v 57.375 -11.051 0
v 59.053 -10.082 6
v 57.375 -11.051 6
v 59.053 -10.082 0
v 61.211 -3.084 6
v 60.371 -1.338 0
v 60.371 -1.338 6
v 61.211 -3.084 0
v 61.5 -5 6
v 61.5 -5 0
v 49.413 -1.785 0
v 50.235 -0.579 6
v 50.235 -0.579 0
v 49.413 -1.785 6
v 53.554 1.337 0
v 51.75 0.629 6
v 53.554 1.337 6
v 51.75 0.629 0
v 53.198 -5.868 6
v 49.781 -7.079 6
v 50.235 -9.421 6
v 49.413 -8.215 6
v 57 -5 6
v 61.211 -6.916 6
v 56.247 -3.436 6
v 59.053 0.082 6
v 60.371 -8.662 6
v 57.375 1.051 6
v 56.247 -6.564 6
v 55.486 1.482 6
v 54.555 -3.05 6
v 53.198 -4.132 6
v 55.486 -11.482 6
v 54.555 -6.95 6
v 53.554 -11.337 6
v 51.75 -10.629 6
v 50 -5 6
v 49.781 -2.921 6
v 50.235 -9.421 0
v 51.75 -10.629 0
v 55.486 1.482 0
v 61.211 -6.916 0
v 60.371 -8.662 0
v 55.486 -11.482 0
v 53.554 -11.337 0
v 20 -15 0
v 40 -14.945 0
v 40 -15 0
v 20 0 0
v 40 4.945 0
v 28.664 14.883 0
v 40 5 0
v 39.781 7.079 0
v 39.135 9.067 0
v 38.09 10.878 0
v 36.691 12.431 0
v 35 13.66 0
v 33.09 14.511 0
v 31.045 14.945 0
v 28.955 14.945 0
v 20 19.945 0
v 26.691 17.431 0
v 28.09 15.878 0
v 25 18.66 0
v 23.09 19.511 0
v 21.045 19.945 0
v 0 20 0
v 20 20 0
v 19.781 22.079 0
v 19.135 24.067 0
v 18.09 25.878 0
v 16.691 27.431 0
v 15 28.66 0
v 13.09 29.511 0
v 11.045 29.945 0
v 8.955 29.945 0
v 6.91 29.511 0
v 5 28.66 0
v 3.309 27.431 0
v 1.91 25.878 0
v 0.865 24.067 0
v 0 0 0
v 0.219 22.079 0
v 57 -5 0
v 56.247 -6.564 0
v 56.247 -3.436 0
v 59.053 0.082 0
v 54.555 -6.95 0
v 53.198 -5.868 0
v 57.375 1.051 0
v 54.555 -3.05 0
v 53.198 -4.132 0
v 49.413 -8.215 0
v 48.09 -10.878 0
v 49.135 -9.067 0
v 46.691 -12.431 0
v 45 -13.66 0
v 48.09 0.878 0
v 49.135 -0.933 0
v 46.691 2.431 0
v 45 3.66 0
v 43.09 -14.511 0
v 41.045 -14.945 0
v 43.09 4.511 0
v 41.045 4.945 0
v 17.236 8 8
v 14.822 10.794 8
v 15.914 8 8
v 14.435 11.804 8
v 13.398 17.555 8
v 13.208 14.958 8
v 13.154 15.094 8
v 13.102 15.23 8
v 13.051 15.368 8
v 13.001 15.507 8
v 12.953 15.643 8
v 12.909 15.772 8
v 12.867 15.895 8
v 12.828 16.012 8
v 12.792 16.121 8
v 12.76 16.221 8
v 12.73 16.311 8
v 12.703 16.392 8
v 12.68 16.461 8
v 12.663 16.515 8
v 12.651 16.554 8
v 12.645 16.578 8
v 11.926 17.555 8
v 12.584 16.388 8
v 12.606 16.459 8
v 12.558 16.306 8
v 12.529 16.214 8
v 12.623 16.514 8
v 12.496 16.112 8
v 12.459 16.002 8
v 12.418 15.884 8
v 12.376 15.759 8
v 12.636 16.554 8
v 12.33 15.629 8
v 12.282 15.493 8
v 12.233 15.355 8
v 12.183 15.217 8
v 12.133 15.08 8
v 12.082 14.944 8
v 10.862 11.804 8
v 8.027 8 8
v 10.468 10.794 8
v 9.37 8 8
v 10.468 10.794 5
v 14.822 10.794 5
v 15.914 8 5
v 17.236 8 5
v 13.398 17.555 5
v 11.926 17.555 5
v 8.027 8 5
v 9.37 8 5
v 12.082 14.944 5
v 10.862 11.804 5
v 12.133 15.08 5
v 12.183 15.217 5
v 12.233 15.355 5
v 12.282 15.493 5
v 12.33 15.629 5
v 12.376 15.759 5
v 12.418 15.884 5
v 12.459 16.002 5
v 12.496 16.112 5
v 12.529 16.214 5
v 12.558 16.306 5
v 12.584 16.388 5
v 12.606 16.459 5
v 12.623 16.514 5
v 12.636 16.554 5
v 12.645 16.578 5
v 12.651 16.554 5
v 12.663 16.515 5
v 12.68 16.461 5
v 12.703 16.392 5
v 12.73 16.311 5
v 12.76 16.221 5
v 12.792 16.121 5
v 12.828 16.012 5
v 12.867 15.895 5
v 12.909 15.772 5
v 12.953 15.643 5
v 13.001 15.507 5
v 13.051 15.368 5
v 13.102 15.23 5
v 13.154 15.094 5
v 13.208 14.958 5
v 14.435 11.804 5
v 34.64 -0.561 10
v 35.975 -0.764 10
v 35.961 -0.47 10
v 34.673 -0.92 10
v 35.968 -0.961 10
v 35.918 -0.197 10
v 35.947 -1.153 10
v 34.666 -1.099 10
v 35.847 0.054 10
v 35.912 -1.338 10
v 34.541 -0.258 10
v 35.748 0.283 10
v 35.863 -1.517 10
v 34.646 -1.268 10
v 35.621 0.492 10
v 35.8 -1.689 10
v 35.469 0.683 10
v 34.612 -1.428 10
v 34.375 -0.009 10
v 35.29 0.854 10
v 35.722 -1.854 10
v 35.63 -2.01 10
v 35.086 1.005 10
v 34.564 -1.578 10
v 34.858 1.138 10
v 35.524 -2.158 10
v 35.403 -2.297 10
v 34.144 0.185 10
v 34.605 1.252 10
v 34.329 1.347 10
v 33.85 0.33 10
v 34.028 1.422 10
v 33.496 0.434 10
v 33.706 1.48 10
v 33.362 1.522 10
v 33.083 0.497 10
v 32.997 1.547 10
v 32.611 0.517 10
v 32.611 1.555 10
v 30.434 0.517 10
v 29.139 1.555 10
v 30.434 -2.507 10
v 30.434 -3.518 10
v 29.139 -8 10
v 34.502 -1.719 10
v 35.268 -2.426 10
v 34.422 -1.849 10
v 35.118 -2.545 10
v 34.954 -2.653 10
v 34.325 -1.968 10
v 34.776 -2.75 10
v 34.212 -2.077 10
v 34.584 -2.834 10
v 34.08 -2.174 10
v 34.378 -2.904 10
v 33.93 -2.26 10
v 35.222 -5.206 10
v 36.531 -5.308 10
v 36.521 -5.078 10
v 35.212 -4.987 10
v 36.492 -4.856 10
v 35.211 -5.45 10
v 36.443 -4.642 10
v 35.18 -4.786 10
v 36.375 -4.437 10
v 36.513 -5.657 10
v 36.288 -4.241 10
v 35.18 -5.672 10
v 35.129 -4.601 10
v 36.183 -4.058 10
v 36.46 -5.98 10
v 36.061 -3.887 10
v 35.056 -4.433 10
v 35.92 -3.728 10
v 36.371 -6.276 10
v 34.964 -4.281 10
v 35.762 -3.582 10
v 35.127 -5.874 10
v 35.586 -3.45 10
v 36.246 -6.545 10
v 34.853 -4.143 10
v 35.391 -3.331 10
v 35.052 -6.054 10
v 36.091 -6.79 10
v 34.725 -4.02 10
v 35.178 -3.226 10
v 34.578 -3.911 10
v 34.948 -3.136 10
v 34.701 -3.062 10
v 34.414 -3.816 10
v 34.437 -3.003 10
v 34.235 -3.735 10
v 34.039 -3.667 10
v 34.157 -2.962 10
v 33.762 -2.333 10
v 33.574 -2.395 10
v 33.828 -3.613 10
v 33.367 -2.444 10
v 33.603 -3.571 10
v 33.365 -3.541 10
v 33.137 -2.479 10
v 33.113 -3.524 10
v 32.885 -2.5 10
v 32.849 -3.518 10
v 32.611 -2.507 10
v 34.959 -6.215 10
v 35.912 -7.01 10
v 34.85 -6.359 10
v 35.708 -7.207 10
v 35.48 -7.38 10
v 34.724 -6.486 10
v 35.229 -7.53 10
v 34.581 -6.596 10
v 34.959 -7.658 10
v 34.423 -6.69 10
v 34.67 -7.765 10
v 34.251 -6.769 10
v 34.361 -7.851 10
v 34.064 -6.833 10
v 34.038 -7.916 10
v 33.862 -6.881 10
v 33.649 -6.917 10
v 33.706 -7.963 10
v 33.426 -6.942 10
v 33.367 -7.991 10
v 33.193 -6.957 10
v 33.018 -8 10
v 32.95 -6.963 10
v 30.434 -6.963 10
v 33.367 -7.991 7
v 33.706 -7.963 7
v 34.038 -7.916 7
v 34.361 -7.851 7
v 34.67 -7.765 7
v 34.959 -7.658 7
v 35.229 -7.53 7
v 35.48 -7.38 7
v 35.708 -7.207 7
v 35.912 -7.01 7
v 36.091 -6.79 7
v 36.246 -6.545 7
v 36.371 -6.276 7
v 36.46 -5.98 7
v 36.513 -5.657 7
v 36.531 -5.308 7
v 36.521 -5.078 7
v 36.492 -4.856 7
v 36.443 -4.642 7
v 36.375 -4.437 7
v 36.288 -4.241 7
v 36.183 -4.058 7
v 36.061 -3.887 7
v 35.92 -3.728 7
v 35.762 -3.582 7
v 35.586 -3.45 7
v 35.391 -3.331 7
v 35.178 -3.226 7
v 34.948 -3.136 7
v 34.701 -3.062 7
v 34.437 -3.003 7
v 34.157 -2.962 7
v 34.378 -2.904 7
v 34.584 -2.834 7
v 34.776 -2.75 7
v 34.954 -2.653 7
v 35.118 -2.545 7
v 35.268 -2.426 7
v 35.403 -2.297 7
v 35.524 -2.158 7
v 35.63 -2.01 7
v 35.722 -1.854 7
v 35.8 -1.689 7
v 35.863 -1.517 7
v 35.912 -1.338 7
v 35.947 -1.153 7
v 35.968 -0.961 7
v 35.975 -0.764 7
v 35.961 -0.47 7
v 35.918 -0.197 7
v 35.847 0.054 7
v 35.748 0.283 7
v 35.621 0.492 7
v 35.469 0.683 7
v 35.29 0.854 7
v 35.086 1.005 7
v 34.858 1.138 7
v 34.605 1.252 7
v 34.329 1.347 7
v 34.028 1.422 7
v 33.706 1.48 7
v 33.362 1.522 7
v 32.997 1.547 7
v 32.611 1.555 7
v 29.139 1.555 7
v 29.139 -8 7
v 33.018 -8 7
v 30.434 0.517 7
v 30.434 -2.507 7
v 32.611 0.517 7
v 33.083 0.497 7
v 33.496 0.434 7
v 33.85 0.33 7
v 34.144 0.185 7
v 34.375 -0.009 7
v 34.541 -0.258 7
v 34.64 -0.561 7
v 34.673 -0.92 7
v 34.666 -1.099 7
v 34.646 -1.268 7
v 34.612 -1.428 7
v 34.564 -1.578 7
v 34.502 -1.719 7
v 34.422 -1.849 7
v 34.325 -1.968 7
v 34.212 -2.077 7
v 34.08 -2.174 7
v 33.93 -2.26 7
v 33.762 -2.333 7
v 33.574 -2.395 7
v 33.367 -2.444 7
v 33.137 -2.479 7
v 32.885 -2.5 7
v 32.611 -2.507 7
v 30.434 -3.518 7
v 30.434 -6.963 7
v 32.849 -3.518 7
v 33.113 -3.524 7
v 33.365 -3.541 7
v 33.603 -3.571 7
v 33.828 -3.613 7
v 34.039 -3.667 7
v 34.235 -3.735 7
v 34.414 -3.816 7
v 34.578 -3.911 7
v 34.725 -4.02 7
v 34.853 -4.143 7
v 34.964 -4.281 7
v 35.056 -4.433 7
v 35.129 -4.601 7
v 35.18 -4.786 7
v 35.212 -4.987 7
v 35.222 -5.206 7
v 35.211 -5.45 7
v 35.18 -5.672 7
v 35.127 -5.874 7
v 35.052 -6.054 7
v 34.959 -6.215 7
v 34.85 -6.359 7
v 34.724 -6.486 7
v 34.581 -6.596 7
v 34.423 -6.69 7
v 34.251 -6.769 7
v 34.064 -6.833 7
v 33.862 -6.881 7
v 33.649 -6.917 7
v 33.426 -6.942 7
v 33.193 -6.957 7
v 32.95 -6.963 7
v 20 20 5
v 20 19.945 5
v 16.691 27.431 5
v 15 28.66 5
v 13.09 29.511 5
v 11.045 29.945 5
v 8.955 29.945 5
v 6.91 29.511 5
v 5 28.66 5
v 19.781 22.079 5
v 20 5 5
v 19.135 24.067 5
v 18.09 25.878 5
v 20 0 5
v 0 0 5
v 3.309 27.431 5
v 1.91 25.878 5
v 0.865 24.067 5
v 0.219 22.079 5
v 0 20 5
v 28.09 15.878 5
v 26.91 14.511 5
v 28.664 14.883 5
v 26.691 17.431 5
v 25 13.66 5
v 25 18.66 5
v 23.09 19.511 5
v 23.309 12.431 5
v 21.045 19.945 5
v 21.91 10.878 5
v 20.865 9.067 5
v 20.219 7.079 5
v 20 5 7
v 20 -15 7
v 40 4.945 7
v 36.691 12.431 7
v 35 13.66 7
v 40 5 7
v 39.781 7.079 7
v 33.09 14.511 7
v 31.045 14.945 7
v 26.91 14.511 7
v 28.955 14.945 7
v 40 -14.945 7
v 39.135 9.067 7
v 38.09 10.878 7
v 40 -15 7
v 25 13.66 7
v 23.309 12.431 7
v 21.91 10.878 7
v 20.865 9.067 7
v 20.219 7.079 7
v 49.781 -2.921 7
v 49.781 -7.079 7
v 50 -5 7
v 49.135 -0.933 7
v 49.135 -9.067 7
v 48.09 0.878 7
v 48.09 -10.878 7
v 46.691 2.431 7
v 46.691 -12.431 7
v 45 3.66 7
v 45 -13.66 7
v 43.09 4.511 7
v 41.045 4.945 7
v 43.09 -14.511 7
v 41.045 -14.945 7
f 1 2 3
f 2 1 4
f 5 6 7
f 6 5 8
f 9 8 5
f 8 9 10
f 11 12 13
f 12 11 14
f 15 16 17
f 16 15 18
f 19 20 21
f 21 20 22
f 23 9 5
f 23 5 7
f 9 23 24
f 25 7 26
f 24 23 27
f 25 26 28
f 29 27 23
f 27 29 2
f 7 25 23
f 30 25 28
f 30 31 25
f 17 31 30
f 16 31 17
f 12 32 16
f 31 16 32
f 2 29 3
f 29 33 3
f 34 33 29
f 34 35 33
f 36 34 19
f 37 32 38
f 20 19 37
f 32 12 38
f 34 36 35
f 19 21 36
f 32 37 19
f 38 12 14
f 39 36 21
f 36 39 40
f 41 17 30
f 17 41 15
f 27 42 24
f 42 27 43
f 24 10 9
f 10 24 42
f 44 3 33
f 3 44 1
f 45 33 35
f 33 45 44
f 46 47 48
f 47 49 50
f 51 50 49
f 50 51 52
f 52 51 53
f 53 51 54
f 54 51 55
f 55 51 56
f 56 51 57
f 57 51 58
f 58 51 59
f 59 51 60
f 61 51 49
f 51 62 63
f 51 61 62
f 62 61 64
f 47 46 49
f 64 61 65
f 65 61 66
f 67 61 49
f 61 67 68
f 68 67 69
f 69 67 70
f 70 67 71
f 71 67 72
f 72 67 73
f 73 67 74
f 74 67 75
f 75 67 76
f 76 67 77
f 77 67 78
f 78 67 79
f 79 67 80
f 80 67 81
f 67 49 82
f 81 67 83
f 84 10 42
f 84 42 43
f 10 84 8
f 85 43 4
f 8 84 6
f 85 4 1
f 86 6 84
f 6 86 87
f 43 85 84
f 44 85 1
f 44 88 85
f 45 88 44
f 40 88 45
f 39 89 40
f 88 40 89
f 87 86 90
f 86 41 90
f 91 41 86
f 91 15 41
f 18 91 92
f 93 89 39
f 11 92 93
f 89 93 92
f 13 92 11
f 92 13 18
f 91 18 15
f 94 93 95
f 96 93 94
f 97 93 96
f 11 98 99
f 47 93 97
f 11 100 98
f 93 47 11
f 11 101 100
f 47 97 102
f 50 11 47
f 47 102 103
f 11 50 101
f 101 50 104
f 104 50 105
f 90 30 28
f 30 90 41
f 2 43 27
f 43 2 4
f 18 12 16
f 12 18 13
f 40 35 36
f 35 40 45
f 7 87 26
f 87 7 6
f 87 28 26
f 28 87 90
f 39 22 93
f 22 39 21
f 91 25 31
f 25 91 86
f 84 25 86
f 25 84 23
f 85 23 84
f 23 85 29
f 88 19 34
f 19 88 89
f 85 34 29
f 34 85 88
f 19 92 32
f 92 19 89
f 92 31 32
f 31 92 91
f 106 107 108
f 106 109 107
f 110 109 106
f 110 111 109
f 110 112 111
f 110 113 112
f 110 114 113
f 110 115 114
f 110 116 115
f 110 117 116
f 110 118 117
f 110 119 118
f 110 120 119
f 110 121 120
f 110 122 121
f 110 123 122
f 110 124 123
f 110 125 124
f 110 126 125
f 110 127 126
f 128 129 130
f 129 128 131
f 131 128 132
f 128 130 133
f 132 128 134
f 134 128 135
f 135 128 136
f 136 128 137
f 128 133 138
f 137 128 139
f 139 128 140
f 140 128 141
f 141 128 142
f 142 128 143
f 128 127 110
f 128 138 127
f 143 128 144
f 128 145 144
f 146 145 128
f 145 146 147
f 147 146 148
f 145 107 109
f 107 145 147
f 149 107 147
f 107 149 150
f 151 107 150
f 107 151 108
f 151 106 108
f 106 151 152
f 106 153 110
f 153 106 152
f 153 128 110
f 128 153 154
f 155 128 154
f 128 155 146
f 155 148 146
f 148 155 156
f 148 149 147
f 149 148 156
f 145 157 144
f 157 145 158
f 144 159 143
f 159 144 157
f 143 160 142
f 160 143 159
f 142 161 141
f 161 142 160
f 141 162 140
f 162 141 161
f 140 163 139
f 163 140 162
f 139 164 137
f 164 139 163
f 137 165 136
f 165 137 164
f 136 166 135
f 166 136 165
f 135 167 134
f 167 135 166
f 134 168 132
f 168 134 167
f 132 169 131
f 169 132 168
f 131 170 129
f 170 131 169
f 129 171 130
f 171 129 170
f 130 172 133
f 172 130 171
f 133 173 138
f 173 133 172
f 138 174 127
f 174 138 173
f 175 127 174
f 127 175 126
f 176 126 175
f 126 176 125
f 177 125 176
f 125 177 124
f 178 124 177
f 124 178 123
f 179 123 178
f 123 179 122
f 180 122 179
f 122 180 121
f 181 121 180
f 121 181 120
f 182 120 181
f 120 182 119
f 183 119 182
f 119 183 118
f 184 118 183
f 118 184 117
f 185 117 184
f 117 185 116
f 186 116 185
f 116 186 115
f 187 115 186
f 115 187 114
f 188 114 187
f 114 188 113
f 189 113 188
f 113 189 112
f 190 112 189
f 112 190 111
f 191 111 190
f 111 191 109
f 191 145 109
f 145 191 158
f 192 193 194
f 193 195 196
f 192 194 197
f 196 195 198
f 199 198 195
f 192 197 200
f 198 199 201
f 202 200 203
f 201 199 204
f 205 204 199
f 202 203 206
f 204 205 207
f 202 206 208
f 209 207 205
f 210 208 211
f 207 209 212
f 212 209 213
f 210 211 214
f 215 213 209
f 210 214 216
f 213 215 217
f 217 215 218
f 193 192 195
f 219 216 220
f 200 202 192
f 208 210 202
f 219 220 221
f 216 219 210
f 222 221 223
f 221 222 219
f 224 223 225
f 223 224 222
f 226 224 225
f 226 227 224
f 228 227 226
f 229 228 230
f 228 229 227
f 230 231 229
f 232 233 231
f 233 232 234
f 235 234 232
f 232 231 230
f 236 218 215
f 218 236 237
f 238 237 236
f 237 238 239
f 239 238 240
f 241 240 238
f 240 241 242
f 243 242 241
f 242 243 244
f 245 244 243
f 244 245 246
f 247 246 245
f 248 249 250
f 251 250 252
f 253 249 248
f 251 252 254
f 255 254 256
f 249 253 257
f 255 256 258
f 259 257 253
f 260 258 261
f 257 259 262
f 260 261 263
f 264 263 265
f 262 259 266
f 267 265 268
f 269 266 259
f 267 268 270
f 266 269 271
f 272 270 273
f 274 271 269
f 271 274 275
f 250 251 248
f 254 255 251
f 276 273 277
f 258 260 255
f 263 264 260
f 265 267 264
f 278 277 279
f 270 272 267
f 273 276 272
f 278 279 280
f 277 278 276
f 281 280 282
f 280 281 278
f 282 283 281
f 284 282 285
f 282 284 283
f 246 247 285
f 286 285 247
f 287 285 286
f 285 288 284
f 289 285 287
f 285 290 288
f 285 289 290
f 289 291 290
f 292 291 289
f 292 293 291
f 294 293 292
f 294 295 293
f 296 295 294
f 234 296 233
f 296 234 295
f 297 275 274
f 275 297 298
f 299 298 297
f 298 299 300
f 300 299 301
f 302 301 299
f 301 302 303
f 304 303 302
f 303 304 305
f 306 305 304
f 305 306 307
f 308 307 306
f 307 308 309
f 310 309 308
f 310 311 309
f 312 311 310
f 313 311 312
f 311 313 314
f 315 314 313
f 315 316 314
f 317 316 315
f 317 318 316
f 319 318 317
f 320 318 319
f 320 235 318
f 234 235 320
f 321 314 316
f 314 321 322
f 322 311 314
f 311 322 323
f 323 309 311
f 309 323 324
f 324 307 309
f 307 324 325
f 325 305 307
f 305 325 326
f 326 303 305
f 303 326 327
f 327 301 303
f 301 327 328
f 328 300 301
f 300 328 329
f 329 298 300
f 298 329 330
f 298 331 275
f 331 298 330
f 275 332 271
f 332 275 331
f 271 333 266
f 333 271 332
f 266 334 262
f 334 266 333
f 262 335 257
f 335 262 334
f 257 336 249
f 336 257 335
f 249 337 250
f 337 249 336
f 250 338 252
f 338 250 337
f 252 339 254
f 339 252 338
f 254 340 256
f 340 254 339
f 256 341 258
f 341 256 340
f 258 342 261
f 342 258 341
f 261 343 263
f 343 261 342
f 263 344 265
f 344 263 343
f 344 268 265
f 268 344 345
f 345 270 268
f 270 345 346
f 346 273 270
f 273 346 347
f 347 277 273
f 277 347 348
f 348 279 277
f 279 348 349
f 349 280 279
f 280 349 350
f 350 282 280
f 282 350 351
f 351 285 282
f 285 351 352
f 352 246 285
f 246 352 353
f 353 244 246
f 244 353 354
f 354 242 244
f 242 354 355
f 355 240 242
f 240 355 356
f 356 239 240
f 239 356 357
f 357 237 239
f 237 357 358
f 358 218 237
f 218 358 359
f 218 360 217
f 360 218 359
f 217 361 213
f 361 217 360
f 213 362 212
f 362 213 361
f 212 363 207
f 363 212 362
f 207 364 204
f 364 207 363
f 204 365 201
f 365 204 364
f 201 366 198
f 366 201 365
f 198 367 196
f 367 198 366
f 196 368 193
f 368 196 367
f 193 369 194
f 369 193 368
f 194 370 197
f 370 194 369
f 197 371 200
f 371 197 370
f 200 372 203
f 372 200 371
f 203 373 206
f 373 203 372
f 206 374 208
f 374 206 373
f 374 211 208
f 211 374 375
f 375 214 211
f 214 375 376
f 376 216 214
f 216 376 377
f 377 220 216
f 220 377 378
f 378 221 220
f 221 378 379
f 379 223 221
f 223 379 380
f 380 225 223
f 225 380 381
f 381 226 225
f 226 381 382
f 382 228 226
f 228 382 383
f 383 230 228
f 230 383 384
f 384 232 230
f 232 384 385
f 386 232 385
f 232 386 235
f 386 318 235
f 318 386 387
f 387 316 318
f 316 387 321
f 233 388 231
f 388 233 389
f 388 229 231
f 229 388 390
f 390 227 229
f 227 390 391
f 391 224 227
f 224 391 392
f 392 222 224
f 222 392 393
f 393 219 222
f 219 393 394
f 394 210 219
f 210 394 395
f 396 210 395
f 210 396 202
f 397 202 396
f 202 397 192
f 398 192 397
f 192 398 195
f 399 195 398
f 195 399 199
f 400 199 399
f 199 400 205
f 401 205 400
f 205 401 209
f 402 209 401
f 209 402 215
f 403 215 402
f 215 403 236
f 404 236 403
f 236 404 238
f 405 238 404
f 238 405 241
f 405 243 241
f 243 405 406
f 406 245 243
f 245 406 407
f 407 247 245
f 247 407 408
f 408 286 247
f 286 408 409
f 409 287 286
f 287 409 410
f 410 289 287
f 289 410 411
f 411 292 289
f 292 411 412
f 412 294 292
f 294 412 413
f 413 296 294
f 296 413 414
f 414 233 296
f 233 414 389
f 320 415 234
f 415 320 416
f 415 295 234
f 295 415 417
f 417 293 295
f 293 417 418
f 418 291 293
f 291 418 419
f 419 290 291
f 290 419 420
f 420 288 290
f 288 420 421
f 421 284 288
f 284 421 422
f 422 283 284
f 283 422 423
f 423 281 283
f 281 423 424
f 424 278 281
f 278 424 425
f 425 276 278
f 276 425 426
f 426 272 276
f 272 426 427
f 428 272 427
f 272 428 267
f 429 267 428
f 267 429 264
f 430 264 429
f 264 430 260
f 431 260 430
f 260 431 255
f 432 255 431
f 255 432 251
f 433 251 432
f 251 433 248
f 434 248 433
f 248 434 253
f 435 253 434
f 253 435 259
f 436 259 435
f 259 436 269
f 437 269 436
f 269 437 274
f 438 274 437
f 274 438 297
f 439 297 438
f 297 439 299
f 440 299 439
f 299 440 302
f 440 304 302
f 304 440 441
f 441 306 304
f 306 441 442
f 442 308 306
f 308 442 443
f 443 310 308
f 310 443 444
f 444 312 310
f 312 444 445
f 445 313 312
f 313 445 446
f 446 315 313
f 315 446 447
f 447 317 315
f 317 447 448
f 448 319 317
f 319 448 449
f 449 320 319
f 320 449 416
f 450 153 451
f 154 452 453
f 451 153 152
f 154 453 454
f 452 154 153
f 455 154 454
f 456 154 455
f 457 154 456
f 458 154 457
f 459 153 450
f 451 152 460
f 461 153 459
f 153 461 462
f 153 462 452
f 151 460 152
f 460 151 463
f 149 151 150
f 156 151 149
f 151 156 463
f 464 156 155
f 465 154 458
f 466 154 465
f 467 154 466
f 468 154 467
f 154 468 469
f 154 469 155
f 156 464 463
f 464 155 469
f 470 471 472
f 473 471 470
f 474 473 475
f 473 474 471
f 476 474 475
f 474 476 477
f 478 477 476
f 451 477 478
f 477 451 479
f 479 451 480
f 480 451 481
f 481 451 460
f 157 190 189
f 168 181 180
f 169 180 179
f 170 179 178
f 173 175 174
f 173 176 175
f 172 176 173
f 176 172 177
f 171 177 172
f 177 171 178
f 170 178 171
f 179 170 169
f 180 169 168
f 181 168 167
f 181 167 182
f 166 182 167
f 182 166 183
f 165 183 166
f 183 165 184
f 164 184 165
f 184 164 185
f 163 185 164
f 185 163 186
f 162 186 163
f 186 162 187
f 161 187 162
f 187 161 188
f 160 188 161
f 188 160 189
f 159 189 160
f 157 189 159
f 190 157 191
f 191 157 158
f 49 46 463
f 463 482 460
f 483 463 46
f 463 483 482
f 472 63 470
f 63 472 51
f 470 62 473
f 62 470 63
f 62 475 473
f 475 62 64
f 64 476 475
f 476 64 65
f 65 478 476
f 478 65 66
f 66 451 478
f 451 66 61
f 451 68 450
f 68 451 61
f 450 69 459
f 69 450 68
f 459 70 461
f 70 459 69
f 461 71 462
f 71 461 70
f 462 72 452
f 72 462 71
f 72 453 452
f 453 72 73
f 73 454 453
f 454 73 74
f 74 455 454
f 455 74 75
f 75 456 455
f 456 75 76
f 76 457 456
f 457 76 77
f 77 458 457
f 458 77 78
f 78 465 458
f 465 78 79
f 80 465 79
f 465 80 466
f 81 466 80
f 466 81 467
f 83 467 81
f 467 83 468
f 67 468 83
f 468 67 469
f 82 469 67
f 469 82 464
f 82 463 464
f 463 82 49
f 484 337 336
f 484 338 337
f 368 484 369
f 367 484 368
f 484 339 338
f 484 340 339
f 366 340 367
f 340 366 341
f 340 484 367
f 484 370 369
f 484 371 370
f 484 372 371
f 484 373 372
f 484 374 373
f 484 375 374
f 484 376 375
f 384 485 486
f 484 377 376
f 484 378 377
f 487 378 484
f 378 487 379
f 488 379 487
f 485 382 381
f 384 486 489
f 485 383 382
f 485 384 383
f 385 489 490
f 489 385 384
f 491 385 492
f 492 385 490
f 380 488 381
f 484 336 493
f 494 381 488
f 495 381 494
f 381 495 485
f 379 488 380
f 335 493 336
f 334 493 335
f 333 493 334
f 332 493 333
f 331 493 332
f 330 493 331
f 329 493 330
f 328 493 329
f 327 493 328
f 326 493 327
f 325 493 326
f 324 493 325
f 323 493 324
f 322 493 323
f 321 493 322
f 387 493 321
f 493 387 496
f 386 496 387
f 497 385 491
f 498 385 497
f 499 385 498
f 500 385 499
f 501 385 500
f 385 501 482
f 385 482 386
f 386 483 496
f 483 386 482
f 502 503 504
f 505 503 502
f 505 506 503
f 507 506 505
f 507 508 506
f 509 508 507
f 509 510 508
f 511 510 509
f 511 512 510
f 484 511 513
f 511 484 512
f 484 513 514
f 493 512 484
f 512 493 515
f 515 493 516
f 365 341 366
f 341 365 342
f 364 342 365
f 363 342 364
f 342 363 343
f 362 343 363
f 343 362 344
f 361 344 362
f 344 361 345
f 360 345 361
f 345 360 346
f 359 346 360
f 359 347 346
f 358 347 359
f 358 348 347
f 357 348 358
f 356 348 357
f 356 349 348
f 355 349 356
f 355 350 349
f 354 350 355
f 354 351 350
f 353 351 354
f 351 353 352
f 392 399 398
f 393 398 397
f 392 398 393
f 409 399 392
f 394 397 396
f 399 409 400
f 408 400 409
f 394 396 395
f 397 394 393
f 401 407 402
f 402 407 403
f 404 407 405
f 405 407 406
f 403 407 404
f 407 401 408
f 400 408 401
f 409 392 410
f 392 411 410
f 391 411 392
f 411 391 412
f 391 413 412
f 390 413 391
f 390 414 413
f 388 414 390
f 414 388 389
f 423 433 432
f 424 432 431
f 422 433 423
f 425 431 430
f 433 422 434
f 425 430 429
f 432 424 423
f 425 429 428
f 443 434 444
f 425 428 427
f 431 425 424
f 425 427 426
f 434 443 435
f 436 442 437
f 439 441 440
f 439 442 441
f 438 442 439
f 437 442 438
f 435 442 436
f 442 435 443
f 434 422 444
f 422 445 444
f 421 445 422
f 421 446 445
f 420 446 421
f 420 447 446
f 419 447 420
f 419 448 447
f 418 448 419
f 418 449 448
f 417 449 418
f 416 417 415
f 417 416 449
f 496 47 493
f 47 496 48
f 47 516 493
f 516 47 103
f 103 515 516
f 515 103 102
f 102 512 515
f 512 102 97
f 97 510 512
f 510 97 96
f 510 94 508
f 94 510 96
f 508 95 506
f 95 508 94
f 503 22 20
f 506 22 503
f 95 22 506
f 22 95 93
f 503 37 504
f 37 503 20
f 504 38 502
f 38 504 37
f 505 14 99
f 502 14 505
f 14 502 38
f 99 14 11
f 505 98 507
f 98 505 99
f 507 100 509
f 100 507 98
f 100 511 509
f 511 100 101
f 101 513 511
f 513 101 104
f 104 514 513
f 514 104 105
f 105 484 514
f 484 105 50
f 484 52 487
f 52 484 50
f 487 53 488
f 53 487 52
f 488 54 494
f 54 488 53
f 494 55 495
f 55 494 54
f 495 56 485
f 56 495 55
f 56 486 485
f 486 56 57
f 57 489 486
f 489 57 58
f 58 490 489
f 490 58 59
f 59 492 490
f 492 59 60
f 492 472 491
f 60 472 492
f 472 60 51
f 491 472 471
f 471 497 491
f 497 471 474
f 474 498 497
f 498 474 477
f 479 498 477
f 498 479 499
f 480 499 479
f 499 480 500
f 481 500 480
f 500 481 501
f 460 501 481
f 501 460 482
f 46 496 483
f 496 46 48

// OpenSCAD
Left_heart_letter = "A"; //Just one letter
Rigth_heart_letter = "B";//Just one letter

linear_extrude(height = 8)
 
  translate([8, 8]) {
     
   text(Left_heart_letter);
 }
 
 linear_extrude(height = 10)
  translate([28, -8]) {
   text(Rigth_heart_letter);
 }


module flatstuff()
{
square(20);
translate([10,20,0]) circle(10);
translate([20,10,0]) circle(10);
}
linear_extrude(height=5) flatstuff();
module flatstuff2()
{
translate([20,-15,0])   
square(20);
translate([30,5,0]) circle(10);
translate([40,-5,0]) circle(10);
}

linear_extrude(height=7) flatstuff2();



difference(){
    translate([55,-5,0]) 
    cylinder(r=6.5, h=6);
    translate([55,-5,0]) 
    cylinder(r=2, h=6);
}
